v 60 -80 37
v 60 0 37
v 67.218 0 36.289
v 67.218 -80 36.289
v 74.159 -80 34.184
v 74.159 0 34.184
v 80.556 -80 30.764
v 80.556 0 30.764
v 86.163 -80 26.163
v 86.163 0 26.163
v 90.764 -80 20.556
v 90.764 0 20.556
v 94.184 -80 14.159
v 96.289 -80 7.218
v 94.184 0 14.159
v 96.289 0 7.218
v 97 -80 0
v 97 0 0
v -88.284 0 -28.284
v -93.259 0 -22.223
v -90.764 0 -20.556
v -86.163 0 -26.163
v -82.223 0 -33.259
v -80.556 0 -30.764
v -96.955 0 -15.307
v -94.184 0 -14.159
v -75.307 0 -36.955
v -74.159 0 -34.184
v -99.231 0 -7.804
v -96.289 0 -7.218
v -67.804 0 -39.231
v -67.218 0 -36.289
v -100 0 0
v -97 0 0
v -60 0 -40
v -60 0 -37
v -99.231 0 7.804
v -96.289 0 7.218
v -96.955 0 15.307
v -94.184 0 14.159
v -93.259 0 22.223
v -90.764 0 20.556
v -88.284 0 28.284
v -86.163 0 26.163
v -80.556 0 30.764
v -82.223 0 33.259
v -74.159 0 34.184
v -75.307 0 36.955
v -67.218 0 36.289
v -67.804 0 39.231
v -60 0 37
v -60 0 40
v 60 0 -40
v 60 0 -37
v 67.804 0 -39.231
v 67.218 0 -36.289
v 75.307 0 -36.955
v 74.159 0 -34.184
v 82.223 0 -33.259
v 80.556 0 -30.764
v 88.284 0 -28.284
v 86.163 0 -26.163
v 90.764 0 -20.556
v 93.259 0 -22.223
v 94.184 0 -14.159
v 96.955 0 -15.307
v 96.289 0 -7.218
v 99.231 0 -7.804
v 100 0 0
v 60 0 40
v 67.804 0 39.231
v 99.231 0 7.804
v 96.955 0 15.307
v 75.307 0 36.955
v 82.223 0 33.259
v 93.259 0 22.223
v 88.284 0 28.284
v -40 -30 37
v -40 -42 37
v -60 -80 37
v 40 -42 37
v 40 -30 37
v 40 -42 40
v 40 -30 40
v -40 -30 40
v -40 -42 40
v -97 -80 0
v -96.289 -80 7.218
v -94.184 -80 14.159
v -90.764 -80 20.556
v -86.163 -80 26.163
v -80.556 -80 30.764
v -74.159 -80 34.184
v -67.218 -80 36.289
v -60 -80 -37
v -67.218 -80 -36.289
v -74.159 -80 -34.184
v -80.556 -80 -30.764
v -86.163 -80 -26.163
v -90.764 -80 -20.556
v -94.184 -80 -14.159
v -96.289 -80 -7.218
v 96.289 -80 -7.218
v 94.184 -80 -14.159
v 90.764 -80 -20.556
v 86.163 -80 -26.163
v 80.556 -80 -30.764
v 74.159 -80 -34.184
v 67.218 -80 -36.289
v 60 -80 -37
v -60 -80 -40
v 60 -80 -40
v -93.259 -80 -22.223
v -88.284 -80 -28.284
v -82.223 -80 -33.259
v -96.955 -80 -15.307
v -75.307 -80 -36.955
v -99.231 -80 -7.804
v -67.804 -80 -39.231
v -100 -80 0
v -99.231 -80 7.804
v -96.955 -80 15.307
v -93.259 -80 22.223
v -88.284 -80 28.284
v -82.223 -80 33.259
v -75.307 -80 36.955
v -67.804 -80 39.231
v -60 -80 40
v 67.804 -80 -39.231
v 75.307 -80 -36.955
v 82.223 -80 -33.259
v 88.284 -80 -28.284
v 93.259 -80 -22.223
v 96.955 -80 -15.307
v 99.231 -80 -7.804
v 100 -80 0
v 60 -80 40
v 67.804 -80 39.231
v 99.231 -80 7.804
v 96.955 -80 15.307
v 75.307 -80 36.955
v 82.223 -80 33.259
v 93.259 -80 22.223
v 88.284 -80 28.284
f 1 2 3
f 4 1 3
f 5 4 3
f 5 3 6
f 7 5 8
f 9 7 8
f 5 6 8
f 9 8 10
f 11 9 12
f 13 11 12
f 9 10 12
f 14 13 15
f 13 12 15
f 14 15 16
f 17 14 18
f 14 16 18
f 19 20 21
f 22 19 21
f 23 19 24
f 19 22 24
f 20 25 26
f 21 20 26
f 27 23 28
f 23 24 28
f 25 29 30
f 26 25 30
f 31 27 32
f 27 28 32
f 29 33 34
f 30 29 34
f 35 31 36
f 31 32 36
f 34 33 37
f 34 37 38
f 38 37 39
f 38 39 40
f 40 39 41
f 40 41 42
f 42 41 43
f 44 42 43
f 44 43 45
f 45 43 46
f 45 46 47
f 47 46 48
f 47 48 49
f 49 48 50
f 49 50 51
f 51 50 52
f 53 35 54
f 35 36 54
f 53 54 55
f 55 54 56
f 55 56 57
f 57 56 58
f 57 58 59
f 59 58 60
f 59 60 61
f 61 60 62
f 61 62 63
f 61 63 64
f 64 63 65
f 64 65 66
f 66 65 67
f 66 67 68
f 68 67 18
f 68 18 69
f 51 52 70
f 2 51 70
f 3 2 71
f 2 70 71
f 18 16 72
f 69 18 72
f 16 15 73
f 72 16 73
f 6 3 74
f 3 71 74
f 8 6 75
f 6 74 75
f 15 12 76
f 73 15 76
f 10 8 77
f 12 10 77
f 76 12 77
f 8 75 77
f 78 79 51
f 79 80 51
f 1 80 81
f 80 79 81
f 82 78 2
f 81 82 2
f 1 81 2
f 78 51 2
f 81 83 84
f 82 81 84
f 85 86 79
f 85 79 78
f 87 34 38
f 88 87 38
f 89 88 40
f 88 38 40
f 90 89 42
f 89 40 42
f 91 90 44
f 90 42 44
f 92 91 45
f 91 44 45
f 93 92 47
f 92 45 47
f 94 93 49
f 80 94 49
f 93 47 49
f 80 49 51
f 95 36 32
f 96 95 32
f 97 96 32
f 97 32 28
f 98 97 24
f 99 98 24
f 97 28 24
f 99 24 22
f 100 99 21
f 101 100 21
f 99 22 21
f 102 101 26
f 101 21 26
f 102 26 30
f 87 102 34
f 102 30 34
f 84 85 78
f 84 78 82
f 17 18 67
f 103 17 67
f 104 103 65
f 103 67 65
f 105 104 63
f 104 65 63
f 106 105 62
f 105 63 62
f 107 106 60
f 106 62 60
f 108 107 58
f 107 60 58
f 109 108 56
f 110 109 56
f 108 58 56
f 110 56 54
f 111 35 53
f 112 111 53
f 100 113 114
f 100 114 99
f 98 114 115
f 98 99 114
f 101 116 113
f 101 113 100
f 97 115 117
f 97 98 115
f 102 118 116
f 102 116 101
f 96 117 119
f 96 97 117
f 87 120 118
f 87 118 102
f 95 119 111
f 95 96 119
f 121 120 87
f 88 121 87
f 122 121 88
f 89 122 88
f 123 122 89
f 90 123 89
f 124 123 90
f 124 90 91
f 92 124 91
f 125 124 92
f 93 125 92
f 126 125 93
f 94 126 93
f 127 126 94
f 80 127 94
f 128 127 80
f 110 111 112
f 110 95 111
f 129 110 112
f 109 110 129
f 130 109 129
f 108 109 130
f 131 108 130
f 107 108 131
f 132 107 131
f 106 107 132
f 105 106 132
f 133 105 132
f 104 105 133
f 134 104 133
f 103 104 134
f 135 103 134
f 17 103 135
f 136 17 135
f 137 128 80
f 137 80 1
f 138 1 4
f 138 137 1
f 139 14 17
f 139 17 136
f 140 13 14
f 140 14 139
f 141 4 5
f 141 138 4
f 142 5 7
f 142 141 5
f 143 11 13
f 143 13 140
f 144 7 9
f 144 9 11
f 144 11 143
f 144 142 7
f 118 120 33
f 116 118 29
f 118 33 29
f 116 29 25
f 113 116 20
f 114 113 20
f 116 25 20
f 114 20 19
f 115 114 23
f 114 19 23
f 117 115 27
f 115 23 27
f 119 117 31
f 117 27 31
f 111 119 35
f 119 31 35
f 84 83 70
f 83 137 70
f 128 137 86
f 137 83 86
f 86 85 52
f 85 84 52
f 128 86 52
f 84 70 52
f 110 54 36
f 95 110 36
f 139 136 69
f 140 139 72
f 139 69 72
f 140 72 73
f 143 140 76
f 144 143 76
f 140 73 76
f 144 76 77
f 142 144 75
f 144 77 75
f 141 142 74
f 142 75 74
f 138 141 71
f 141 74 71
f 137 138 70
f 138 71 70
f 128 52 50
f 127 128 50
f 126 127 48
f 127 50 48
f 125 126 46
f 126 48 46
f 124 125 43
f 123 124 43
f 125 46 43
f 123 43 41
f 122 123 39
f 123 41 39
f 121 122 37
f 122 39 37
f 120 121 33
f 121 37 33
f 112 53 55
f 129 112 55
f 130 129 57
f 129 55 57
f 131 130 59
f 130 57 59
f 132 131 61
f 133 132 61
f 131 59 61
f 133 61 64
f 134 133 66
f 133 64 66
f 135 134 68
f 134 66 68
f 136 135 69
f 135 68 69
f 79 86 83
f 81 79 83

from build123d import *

# Parameters (mm, degrees)
F1_DEPTH = 80
F2_W     = 80
F2_H     = 12
F3_DEPTH = 25


with BuildPart() as f1:
    # F0 (on Front) → F1 (new body)
    with BuildSketch(Plane.XZ):
        with BuildLine():
            Line((60, 40), (-60, 40))
            ThreePointArc((-60, 40), (-88.284271, 28.284271), (-100, 0))
            ThreePointArc((-100, 0), (-88.284271, -28.284271), (-60, -40))
            Line((-60, -40), (60, -40))
            ThreePointArc((60, -40), (88.284271, -28.284271), (100, 0))
            ThreePointArc((100, 0), (88.284271, 28.284271), (60, 40))
        make_face()
        with BuildLine():
            ThreePointArc((-97, 0), (-86.162951, 26.162951), (-60, 37))
            Line((-60, 37), (60, 37))
            ThreePointArc((60, 37), (86.162951, 26.162951), (97, 0))
            ThreePointArc((97, 0), (86.162951, -26.162951), (60, -37))
            Line((60, -37), (-60, -37))
            ThreePointArc((-60, -37), (-86.162951, -26.162951), (-97, 0))
        make_face(mode=Mode.SUBTRACT)
    extrude(amount=F1_DEPTH)

    # F2 (on face) → F3 (cut)
    with BuildSketch(Plane.XY.offset(40)):
        with Locations((0, -36)):
            Rectangle(F2_W, F2_H)
    extrude(amount=-F3_DEPTH, mode=Mode.SUBTRACT)


solid = f1.part
